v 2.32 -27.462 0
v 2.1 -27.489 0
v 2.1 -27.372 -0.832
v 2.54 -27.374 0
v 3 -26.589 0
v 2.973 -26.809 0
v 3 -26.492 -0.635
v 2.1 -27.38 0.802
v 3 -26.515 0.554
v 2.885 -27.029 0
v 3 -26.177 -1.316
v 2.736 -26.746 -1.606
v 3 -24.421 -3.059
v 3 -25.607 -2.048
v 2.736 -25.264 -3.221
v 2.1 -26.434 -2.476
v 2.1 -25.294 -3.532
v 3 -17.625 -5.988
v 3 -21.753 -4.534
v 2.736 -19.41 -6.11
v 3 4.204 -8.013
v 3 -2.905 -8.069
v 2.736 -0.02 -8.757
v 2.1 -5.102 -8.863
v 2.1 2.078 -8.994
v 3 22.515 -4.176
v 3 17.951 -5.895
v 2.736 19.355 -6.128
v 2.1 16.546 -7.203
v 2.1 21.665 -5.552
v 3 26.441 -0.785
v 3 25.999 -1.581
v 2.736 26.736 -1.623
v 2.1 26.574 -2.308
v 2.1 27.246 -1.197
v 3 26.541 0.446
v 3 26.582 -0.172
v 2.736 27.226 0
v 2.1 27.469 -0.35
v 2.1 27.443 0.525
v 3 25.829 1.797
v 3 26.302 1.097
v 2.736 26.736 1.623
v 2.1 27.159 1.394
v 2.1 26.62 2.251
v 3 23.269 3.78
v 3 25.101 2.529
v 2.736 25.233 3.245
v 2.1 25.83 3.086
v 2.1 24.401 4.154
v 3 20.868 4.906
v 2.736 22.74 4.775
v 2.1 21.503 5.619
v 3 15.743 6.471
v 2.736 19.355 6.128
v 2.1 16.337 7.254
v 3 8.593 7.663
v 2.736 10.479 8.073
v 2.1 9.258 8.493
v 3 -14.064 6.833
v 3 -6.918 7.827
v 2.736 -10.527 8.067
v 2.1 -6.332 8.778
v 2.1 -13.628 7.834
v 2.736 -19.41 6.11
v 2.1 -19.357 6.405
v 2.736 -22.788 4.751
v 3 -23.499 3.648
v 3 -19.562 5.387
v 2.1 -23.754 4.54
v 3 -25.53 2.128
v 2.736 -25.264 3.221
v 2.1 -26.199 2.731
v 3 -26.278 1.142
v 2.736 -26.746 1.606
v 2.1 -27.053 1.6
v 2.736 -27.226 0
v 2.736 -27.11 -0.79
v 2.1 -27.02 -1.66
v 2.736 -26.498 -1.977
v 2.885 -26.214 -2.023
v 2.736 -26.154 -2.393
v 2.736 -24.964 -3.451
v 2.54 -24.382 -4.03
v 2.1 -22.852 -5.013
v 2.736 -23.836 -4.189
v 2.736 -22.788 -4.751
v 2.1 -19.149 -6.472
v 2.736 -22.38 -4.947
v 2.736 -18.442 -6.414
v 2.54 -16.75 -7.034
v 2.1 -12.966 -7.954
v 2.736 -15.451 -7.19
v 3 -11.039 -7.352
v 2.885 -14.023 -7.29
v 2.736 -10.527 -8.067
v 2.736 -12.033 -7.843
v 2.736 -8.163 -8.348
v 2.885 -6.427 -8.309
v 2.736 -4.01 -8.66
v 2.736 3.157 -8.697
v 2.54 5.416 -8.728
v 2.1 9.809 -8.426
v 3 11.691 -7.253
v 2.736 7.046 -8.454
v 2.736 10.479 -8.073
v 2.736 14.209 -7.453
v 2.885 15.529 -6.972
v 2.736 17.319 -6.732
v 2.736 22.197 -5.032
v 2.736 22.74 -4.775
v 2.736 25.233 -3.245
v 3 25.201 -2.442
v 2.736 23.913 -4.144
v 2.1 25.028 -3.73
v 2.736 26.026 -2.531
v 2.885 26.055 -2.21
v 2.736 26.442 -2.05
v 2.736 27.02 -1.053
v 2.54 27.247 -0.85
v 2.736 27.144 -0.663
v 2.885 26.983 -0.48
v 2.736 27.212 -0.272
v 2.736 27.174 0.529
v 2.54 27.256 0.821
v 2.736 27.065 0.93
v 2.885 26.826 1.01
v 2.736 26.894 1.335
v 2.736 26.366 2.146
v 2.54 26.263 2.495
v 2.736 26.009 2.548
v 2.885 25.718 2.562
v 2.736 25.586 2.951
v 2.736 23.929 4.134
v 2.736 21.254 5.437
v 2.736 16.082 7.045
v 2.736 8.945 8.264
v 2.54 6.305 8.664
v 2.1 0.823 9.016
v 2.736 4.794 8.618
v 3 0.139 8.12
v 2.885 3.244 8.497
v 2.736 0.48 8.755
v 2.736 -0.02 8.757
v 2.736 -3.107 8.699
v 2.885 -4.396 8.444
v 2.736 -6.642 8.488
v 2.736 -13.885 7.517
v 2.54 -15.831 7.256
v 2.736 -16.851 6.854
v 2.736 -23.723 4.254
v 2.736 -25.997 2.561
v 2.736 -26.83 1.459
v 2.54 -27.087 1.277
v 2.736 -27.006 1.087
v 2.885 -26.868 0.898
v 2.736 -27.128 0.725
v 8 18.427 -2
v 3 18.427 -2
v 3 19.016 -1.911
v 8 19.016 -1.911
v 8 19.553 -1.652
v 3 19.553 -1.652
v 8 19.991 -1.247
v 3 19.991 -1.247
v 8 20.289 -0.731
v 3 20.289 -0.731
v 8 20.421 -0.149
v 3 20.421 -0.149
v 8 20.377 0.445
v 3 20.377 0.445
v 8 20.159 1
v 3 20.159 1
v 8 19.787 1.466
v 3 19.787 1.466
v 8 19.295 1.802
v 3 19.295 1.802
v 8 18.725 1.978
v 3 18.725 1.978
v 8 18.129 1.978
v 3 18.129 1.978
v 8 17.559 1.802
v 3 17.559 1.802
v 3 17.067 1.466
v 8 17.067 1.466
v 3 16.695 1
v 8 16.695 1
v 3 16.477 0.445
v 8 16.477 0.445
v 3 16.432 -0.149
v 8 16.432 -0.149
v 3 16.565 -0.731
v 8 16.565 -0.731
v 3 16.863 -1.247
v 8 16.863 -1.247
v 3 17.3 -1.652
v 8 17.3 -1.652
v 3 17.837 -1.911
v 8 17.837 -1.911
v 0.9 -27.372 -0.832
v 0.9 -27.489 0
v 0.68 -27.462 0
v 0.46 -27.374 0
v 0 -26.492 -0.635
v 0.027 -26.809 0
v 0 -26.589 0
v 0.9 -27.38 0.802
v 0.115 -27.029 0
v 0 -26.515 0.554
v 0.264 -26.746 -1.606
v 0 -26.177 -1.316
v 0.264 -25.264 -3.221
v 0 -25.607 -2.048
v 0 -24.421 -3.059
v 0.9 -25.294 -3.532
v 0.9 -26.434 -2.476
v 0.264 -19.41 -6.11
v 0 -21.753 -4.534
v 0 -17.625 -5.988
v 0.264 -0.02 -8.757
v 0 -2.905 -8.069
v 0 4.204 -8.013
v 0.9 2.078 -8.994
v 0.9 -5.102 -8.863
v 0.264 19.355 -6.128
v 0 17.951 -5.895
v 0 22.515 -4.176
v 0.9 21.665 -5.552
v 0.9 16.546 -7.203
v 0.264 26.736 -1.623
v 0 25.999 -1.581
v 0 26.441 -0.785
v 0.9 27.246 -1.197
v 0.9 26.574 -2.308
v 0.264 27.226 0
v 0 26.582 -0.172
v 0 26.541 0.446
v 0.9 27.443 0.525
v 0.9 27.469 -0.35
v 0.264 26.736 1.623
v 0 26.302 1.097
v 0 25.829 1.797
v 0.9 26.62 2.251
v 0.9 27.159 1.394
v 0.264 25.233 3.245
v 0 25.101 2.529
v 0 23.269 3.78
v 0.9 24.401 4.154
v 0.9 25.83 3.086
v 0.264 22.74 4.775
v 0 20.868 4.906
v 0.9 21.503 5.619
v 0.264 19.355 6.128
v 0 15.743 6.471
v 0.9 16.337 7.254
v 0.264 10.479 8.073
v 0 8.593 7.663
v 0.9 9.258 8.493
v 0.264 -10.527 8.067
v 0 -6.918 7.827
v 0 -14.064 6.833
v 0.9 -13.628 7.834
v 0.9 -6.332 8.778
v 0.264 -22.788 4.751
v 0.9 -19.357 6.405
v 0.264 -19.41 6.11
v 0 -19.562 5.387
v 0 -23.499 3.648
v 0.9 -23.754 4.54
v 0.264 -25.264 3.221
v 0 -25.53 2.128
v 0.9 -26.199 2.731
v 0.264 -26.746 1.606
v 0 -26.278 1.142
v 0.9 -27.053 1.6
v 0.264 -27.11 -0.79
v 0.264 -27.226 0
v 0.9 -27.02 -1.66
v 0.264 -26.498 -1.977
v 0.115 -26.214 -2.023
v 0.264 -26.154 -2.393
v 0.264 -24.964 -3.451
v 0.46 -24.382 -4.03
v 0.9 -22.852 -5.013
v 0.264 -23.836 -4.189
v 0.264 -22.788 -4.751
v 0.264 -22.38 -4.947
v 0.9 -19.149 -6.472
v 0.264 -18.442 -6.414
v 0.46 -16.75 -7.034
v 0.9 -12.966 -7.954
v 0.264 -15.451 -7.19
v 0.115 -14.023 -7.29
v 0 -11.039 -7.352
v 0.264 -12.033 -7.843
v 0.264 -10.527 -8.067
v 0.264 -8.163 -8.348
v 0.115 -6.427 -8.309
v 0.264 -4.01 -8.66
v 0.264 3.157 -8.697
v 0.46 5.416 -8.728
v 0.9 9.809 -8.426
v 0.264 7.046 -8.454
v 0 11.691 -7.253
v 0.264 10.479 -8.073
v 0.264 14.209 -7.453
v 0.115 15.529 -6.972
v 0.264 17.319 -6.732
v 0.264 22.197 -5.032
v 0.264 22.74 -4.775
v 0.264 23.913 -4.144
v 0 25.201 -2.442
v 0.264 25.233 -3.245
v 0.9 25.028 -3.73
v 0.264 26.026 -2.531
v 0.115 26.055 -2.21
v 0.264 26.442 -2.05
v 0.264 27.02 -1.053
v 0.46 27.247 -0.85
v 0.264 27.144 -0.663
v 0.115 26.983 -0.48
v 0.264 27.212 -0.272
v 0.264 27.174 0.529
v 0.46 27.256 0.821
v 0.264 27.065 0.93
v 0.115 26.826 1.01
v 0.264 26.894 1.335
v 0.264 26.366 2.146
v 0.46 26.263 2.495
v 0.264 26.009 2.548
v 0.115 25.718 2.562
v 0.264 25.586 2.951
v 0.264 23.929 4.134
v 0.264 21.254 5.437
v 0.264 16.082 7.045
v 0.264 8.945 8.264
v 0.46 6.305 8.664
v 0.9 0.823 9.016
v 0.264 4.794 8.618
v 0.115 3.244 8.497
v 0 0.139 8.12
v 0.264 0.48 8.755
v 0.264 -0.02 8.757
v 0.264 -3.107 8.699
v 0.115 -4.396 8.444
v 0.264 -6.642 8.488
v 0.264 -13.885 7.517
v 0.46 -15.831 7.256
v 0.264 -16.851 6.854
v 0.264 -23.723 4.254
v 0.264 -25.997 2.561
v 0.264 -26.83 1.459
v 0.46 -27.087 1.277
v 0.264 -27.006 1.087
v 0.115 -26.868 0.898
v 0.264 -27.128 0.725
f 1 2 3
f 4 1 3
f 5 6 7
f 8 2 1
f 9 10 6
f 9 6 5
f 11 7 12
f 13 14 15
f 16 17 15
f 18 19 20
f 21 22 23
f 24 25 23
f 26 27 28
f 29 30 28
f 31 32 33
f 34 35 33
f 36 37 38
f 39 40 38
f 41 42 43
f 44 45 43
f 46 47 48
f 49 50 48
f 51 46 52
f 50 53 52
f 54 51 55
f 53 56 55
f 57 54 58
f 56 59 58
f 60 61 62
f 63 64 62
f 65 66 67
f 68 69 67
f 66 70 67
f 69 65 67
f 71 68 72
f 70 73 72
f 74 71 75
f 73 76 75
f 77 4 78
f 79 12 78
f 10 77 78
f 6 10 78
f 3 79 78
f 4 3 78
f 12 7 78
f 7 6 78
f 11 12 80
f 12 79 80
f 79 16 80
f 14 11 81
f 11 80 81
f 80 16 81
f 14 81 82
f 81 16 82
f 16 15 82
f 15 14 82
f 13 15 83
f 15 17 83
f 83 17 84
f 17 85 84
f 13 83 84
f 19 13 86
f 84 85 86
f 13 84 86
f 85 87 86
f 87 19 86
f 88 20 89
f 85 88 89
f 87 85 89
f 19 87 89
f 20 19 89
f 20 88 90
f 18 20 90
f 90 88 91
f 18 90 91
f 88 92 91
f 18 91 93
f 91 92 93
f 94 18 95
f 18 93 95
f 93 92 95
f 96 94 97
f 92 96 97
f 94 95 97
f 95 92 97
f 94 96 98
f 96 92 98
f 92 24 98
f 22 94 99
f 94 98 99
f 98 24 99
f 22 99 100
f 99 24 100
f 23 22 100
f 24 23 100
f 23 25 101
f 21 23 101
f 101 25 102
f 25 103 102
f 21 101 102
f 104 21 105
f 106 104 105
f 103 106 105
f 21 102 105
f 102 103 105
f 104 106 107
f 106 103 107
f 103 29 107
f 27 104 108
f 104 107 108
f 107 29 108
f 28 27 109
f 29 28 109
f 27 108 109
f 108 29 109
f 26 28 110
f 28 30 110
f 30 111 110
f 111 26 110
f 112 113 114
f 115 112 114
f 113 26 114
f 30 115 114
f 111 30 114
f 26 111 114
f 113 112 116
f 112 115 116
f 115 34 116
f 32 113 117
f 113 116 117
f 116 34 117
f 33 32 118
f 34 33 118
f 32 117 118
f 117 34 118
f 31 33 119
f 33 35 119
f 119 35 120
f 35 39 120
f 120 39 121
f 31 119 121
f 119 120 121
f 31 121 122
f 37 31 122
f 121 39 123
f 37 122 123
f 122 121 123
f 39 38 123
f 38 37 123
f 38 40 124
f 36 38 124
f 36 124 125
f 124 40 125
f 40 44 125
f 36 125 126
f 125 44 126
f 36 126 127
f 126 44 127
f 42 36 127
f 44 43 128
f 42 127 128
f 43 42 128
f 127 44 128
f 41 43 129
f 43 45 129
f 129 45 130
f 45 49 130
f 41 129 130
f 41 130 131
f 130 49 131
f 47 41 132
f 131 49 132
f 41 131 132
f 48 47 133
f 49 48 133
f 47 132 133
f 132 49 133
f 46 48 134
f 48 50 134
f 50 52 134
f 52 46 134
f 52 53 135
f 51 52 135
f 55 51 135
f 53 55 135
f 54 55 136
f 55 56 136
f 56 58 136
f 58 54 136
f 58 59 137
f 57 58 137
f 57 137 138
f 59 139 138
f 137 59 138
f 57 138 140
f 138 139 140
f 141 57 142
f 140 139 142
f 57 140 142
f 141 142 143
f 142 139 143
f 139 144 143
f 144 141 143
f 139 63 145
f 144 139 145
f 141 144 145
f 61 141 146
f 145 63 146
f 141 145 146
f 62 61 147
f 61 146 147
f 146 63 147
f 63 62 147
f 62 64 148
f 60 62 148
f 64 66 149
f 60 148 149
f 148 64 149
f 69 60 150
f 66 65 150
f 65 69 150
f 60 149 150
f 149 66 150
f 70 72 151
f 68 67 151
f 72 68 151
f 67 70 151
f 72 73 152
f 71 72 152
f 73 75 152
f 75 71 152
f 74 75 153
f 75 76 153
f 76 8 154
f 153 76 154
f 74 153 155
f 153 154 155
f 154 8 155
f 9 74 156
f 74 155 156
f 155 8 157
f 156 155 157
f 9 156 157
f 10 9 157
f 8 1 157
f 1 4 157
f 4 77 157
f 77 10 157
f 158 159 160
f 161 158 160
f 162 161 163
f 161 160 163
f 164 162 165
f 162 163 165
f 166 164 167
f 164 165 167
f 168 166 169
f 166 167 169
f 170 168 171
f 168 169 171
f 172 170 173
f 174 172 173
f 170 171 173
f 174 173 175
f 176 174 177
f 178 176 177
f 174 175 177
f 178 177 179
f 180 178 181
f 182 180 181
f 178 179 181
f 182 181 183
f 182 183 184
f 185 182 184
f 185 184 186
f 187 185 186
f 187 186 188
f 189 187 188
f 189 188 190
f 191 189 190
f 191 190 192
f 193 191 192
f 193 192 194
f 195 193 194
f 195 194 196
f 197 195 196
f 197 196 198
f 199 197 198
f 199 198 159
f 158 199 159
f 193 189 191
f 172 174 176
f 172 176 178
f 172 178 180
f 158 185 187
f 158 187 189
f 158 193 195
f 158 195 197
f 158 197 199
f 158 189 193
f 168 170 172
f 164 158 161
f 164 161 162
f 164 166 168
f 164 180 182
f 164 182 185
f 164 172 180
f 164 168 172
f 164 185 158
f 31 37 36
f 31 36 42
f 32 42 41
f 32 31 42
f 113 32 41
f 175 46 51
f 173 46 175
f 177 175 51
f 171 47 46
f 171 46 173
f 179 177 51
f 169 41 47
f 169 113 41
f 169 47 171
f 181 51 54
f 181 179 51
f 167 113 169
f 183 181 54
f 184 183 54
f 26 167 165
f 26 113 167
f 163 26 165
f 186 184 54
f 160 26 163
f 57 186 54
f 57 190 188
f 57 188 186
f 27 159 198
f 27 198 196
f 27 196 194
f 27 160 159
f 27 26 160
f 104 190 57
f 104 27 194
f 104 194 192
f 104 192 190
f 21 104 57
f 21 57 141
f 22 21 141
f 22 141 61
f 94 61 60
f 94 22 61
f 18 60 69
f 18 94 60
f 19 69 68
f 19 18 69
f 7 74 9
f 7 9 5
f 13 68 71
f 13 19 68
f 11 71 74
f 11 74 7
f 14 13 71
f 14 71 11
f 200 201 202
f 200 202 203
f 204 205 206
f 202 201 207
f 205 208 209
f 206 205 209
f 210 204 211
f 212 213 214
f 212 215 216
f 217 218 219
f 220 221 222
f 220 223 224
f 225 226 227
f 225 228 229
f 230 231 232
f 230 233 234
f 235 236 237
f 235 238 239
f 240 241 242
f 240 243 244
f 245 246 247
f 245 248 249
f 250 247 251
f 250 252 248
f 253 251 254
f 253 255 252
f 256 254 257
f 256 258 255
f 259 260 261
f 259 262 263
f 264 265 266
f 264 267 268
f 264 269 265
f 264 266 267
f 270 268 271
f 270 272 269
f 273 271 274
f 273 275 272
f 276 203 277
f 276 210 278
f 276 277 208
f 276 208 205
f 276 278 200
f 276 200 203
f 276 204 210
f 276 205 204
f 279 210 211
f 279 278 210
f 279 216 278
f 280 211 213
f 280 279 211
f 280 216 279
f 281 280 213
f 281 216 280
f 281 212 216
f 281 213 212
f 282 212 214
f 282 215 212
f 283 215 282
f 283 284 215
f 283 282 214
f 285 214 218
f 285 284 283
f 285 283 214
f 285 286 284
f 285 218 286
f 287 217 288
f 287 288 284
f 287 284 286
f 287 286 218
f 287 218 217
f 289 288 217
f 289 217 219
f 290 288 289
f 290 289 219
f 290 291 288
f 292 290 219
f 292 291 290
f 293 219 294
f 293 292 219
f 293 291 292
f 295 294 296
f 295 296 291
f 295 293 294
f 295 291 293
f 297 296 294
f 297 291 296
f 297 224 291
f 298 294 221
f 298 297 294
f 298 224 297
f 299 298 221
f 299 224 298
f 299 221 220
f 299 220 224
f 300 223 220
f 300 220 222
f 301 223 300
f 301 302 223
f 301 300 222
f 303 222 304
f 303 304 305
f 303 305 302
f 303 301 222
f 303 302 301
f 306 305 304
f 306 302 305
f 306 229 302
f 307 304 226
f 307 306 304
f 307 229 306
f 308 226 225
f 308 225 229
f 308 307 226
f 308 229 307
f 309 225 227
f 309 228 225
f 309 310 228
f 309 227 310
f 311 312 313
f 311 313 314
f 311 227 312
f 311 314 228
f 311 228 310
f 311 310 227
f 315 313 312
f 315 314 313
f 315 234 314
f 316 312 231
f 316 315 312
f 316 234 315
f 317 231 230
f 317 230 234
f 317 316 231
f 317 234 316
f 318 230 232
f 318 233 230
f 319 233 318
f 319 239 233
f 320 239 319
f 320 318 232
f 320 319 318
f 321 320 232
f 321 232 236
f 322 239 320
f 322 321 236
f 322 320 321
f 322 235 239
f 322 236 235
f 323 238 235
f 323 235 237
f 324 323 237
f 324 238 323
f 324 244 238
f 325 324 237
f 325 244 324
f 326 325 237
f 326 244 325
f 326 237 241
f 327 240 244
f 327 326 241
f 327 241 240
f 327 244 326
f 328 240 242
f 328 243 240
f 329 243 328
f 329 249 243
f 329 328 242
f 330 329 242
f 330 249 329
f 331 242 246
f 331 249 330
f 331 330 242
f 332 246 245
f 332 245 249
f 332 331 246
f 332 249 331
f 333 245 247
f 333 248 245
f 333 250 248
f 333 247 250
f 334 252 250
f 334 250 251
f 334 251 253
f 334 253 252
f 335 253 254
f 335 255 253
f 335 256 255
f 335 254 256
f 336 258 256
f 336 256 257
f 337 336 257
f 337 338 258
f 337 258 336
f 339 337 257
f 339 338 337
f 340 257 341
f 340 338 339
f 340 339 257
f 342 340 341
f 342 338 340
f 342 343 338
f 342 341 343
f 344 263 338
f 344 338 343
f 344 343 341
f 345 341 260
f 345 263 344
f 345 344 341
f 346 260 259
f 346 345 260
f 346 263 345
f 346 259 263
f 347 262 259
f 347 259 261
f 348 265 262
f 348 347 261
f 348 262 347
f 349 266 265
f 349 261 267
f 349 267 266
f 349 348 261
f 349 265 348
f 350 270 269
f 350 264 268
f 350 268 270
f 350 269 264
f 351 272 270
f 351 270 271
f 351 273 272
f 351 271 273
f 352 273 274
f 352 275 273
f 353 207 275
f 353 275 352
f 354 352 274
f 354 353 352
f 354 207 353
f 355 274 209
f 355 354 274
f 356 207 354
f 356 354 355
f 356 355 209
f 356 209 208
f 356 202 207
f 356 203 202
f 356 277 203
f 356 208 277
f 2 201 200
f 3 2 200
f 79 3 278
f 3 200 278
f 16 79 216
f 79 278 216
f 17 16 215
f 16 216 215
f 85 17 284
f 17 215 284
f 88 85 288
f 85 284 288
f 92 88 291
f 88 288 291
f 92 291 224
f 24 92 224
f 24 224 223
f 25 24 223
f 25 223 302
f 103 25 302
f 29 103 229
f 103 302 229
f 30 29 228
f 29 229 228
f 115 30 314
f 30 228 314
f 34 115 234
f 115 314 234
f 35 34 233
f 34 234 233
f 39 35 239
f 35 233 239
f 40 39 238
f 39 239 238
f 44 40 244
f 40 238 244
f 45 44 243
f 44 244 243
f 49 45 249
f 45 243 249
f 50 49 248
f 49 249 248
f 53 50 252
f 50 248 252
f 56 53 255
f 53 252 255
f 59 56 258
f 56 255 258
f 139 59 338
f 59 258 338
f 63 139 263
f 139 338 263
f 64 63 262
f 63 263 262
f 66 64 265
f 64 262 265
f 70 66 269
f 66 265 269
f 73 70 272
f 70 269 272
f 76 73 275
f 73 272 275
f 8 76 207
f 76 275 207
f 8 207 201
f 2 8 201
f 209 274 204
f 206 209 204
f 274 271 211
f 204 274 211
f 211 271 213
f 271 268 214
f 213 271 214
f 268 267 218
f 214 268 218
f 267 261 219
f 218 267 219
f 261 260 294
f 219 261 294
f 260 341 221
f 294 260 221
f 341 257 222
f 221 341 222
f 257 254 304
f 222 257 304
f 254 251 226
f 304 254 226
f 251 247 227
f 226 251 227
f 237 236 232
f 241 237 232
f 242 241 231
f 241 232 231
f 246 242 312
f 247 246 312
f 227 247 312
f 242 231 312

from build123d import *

# Parameters (mm, degrees)
SKETCH2_RX          = 27.489278617
SKETCH2_RY          = 9.020162911
BOSS_EXTRUDE2_DEPTH = 3
FILLET2_R           = 0.9
SKETCH3_R           = 2
BOSS_EXTRUDE3_DEPTH = 8


with BuildPart() as part:
    # Sketch2 → Boss-Extrude2 (new body)
    with BuildSketch(Plane(origin=(0, 0, 0), x_dir=(0, 0, -1), z_dir=(1, 0, 0))):
        with Locations(Location((0, 0), (0, 0, -90))):
            Ellipse(SKETCH2_RX, SKETCH2_RY)
    extrude(amount=BOSS_EXTRUDE2_DEPTH)

    # Fillet2
    fillet2_edges = [part.edges().sort_by_distance(p)[0] for p in [
        (0, 27.475941738, 0.280945539),
        (3, 27.475941738, 0.280945539),
    ]]
    fillet(fillet2_edges, radius=FILLET2_R)

    # Sketch3 → Boss-Extrude3 (add)
    with BuildSketch(Plane(origin=(0, 0, 0), x_dir=(0, 0, -1), z_dir=(1, 0, 0))):
        with Locations((0, 18.426854194)):
            Circle(SKETCH3_R)
    extrude(amount=BOSS_EXTRUDE3_DEPTH)


solid = part.part
